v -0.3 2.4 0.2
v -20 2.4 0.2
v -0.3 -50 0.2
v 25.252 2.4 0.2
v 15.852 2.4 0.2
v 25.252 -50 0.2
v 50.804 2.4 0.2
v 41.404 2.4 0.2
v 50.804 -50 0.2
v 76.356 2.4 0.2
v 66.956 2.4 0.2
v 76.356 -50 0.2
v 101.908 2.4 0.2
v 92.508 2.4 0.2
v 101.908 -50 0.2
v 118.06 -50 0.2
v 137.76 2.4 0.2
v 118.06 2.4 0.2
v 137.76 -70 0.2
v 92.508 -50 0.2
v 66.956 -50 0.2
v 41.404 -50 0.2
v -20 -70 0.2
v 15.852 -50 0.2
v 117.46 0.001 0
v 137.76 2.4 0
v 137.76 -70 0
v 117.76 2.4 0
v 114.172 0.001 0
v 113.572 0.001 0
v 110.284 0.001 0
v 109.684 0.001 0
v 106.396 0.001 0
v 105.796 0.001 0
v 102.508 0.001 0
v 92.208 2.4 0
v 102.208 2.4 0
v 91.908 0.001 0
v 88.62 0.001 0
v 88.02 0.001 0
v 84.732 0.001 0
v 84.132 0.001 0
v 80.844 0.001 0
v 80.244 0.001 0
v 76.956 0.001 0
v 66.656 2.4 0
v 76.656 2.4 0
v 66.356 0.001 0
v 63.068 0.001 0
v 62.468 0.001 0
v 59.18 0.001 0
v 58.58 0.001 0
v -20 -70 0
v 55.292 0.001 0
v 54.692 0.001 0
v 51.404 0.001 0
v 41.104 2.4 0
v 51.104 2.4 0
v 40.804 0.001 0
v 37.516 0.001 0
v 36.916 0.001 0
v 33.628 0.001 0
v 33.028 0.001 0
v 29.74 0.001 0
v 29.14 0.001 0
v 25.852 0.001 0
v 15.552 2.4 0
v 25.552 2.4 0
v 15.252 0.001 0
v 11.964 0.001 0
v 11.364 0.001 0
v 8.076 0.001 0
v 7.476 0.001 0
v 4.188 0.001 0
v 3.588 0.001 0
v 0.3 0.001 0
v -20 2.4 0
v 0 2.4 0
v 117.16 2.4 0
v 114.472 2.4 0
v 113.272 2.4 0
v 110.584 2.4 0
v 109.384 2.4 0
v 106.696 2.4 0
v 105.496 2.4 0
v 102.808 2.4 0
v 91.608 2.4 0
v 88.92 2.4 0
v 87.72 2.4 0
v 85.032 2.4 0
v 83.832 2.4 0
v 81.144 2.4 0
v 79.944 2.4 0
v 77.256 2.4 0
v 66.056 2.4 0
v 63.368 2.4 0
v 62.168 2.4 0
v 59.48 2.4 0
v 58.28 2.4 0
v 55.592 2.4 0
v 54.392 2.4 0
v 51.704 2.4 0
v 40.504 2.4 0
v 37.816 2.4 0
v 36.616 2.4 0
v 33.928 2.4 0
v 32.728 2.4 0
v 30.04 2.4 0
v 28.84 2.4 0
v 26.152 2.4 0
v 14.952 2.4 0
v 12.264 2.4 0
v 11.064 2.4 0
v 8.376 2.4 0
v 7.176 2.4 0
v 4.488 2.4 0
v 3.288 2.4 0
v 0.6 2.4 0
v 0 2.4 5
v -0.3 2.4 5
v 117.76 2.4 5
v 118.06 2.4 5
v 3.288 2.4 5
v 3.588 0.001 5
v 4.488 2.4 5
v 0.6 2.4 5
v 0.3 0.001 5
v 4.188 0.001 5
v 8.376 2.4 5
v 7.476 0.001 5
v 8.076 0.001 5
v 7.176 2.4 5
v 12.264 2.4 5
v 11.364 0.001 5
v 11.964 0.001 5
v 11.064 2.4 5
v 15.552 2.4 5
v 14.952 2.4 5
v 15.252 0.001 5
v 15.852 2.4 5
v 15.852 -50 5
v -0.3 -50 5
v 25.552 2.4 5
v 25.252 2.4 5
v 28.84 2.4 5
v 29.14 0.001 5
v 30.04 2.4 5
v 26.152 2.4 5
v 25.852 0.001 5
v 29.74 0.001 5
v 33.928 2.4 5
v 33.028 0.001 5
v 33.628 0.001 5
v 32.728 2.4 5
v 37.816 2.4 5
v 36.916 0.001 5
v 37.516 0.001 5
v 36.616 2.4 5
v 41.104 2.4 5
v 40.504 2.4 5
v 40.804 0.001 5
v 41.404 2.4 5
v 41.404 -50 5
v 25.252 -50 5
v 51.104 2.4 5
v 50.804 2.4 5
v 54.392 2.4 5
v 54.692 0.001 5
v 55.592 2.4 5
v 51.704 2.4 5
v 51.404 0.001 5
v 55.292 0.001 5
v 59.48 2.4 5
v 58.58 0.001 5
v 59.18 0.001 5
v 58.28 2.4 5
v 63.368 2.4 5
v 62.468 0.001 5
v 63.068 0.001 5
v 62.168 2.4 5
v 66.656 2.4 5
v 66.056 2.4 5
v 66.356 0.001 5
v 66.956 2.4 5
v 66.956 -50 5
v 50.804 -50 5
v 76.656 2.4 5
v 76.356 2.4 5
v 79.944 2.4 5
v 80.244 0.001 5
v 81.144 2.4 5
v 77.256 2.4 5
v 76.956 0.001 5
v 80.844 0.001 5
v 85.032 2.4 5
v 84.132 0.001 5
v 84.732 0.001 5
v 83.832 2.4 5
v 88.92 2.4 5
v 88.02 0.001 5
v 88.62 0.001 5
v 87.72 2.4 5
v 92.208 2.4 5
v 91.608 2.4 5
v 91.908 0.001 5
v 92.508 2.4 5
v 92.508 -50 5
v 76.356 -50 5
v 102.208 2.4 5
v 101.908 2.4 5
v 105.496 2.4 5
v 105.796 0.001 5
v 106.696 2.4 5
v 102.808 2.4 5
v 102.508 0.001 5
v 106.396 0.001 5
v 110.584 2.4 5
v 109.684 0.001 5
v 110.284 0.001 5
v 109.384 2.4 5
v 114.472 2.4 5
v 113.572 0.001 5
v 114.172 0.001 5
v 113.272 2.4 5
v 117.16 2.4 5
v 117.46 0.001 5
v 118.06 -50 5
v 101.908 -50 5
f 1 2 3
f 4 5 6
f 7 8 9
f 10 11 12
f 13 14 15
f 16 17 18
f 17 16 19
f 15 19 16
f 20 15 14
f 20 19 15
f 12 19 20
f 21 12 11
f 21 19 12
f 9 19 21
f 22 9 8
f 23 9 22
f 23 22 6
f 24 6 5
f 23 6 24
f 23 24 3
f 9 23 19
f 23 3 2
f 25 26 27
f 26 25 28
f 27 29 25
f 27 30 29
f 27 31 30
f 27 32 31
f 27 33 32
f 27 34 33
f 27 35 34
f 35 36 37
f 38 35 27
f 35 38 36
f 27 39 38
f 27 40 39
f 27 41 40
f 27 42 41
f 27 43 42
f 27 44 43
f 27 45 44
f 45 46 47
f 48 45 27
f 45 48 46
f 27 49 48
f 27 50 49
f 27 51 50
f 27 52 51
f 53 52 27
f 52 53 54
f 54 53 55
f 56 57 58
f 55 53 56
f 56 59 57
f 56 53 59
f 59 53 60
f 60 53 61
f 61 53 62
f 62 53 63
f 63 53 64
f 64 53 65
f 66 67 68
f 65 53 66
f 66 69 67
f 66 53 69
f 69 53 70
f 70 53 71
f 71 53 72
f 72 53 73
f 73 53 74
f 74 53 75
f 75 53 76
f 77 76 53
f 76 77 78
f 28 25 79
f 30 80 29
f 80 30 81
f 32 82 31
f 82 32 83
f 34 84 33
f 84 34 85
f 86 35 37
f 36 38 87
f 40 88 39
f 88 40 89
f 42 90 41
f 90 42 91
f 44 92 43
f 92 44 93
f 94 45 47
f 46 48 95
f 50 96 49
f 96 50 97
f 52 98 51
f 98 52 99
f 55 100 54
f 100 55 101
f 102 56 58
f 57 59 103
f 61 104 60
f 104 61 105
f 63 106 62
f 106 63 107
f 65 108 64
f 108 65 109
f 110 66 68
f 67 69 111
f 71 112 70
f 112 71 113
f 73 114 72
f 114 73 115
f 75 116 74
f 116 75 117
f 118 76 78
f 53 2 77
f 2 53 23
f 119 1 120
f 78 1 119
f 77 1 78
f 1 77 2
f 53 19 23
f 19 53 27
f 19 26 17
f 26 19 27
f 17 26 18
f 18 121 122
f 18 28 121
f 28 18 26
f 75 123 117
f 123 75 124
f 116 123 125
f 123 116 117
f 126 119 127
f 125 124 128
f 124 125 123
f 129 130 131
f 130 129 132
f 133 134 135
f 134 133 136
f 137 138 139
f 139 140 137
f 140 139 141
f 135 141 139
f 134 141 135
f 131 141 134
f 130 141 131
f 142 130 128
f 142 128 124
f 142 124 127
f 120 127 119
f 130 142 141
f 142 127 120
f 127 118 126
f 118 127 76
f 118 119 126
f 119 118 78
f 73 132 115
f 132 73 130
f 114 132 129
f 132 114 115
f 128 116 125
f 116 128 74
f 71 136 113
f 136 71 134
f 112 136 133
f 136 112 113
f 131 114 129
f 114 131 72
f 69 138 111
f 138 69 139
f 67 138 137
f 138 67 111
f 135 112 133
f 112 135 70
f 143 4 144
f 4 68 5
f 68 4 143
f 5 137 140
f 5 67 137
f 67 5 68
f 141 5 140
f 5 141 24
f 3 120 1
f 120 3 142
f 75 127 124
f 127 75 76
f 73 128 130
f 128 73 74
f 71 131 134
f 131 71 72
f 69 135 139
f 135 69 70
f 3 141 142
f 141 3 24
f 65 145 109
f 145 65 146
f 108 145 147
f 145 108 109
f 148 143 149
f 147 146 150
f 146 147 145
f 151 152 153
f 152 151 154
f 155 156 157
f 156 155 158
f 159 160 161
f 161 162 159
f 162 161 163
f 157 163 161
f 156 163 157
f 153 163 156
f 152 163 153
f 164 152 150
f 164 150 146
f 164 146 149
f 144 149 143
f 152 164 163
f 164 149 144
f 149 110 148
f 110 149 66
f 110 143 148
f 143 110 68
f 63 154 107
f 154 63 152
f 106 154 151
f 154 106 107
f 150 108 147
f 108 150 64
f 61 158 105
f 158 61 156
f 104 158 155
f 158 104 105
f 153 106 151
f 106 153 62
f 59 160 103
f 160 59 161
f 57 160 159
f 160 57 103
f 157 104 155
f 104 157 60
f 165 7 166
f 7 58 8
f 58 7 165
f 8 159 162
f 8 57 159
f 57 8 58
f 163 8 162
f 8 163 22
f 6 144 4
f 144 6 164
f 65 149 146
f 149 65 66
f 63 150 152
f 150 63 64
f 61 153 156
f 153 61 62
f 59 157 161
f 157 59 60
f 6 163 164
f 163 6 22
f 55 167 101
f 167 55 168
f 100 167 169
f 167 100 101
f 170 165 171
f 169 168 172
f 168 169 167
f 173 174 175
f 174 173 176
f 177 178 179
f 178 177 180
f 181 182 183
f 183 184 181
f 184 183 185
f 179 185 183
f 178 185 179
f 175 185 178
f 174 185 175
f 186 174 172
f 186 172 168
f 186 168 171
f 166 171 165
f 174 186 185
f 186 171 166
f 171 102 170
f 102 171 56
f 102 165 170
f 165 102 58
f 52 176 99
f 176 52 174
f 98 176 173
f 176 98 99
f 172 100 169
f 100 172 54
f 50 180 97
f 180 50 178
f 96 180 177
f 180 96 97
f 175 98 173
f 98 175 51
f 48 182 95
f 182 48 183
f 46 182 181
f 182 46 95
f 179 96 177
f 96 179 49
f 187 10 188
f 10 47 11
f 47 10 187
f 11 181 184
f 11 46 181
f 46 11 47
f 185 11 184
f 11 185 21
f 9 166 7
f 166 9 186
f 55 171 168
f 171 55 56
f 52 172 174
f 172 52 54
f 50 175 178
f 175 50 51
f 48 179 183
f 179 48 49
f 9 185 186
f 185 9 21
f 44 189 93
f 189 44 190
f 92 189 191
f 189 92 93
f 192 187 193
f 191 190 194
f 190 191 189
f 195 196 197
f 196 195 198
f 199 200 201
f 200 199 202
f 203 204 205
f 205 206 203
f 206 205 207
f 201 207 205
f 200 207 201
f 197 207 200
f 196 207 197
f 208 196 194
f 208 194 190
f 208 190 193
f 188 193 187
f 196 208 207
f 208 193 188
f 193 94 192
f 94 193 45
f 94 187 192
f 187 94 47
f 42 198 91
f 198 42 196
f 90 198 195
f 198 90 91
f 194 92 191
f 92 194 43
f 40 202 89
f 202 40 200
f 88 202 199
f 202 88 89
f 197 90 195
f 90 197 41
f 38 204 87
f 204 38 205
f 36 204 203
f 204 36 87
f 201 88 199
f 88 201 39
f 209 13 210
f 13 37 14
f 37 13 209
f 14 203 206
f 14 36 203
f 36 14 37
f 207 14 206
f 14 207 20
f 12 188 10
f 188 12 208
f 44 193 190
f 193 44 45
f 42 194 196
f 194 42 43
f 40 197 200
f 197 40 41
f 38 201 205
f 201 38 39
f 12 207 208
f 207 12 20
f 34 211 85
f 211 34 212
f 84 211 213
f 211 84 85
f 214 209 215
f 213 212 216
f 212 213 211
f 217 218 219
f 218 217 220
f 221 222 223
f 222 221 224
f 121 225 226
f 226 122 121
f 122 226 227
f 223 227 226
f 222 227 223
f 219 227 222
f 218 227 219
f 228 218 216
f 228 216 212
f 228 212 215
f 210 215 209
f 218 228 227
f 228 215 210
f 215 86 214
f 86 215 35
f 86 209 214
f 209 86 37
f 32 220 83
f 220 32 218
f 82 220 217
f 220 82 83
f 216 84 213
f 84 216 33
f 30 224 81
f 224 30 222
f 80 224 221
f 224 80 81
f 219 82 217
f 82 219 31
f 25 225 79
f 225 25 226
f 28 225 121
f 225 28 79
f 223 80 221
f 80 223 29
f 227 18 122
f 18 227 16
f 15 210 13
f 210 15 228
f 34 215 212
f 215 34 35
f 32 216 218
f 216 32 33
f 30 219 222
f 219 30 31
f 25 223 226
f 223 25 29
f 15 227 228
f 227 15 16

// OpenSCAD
alternate = 0;

tpla=true;pp=false; material = tpla;
jigsaw=0;suture=1; type = suture;

approx_h = 5;
approx_w = 17;

b_mult = 4.48; // 3

h_min = .5;

repeats = 5;

wamin = .6;
wbmin = wamin * b_mult;

// jigsaw settings
t = 35; // angle
m = wamin * .5;
n = wbmin * .5;
sect = 1 / cos(t);
ra = ( m + n*sect - n ) / (2 - sect);
rb = ( n - ra*(cos(t)-1) ) / cos(t);

// suture settings
suture_dw = -0.3;
suture_w2 = wamin - 2 * suture_dw;
suture_w1 = wbmin - 2 * suture_dw;
suture_l = 2.4;

tot_l = 50;

brim = 10;
outer_brim = 20;
brim_h = .2;

fn=32;

h = h_min * alternate + (1-alternate) * approx_h;

dwa = ra*cos(t);
dwb = rb*cos(t);
dla = ra*sin(t);
dlb = rb*sin(t);


if (type == jigsaw)
{
    echo("min width a:", 2*(dwa+dwb-rb));
    echo("min width b:", 2*(dwa+dwb-ra));
}
else
{
    echo("min width a:", suture_w2 + 2*suture_dw);
    echo("min width b:", suture_w1 + 2*suture_dw);
}
elem_w = (dwa+dwb)*2 * (1-type) + type * (suture_w1+suture_w2+2*suture_dw);
elem_l = (dla+dlb+ra+rb) * (1-type) + type * suture_l;


rep_x = round(approx_w / elem_w);
rep_z = round(approx_h / h) * alternate + (1-alternate);

echo("rep_x:", rep_x);

tot_w = rep_x * elem_w;
tot_h = rep_z * h;
echo("elem width:", elem_w);
echo("elem length:", elem_l);
echo("total width:", tot_w);
echo("total height:", tot_h);

module half()
{
    if (type == jigsaw) half_jigsaw();
        else half_suture();
}
module half_suture()
{
    //translate()
    linear_extrude(h)
    polygon(points=[
    [.001,0],
    [.001,elem_l], 
    [-.5*suture_w2,elem_l],
    [-.5*suture_w2-suture_dw,0],
    [-.5*suture_w2-suture_dw,0]
    ]);
}
module half_jigsaw()
{
    translate([0,elem_l-ra])
    difference()
    {
        union()
        {
            difference()
            {
                cylinder(r=ra, h=h, $fn=fn);
                translate([0.001,-ra,-h]) cube([rb,ra+rb,h*4]);
            }
            translate([-dwa-dwb,-rb-dla-dlb,0]) cube([dwa+dwb+.001,rb+dlb,h]);
        }
        translate([-dwa-dwb,-dla-dlb,-h]) cylinder(r=rb, h=h*4, $fn=fn);
    }
}

module whole()
{
    translate([.5*elem_w,0])
    union()
    {
        half();
        scale([-1,1,1]) half();
    }
}

module whole_alt()
{
    //translate([0,0])
    union()
    {
        translate([elem_w,0,0]) half();
        scale([-1,1,1]) half();
    }
}

module interface(mat = true)
{
    for (z = [0:rep_z-1])
    {
        translate([0,0,z*h])
        for (x = [0:rep_x-1])
        {
            translate([elem_w*x,0,0]) 
            if ((alternate && ((z % 2) == 0) == mat) || (!alternate && pp)) whole();
                else whole_alt();
                
        }
    }
}

module full()
{
    if (material == tpla)
    {
        translate([-brim,0,0]) cube([brim,elem_l,brim_h]);
        translate([tot_w,0,0]) cube([brim,elem_l,brim_h]);
        translate([-brim,-tot_l-outer_brim,0]) cube([tot_w+2*brim, tot_l+outer_brim, brim_h]);
        
        
        translate([-wamin/2,-tot_l,0]) cube([tot_w+wamin, tot_l+.001, tot_h]);
        translate([-wamin/2,0,0]) cube([wamin/2, elem_l, tot_h]);
        translate([tot_w,0,0]) cube([wamin/2, elem_l, tot_h]);
        interface(tpla);
    }
    else
    {
        *translate([-brim,elem_l,0]) cube([tot_w+2*brim, tot_l+outer_brim, brim_h]);
        difference()
        {
            translate([0,.001,.001]) cube([tot_w, tot_l + elem_l, tot_h-.002]);
            interface(tpla);
        }
        translate([-wamin/2,elem_l,0]) cube([tot_w+wamin, tot_l + elem_l, tot_h-.002]);
        //translate([0,elem_l,0]) cube([tot_w, tot_l, tot_h]);
        //translate([0,elem_l,0]) scale([1,-1,1]) interface(b);
    }
}

if (material == tpla)
{
    translate([-outer_brim,-tot_l-outer_brim,0])
    cube([outer_brim,elem_l + tot_l+outer_brim,brim_h]);
    translate([repeats*(tot_w+brim)-brim,-tot_l-outer_brim,0])
    cube([outer_brim,elem_l + tot_l+outer_brim,brim_h]);
}
else
{
    translate([-outer_brim,elem_l,0])
    cube([tot_w*repeats+(repeats-1)*brim+2*outer_brim, tot_l+outer_brim, brim_h]);
}
for (i = [0:repeats-1])
{
    translate([(tot_w+brim)*i,0,0])
    full();
}
